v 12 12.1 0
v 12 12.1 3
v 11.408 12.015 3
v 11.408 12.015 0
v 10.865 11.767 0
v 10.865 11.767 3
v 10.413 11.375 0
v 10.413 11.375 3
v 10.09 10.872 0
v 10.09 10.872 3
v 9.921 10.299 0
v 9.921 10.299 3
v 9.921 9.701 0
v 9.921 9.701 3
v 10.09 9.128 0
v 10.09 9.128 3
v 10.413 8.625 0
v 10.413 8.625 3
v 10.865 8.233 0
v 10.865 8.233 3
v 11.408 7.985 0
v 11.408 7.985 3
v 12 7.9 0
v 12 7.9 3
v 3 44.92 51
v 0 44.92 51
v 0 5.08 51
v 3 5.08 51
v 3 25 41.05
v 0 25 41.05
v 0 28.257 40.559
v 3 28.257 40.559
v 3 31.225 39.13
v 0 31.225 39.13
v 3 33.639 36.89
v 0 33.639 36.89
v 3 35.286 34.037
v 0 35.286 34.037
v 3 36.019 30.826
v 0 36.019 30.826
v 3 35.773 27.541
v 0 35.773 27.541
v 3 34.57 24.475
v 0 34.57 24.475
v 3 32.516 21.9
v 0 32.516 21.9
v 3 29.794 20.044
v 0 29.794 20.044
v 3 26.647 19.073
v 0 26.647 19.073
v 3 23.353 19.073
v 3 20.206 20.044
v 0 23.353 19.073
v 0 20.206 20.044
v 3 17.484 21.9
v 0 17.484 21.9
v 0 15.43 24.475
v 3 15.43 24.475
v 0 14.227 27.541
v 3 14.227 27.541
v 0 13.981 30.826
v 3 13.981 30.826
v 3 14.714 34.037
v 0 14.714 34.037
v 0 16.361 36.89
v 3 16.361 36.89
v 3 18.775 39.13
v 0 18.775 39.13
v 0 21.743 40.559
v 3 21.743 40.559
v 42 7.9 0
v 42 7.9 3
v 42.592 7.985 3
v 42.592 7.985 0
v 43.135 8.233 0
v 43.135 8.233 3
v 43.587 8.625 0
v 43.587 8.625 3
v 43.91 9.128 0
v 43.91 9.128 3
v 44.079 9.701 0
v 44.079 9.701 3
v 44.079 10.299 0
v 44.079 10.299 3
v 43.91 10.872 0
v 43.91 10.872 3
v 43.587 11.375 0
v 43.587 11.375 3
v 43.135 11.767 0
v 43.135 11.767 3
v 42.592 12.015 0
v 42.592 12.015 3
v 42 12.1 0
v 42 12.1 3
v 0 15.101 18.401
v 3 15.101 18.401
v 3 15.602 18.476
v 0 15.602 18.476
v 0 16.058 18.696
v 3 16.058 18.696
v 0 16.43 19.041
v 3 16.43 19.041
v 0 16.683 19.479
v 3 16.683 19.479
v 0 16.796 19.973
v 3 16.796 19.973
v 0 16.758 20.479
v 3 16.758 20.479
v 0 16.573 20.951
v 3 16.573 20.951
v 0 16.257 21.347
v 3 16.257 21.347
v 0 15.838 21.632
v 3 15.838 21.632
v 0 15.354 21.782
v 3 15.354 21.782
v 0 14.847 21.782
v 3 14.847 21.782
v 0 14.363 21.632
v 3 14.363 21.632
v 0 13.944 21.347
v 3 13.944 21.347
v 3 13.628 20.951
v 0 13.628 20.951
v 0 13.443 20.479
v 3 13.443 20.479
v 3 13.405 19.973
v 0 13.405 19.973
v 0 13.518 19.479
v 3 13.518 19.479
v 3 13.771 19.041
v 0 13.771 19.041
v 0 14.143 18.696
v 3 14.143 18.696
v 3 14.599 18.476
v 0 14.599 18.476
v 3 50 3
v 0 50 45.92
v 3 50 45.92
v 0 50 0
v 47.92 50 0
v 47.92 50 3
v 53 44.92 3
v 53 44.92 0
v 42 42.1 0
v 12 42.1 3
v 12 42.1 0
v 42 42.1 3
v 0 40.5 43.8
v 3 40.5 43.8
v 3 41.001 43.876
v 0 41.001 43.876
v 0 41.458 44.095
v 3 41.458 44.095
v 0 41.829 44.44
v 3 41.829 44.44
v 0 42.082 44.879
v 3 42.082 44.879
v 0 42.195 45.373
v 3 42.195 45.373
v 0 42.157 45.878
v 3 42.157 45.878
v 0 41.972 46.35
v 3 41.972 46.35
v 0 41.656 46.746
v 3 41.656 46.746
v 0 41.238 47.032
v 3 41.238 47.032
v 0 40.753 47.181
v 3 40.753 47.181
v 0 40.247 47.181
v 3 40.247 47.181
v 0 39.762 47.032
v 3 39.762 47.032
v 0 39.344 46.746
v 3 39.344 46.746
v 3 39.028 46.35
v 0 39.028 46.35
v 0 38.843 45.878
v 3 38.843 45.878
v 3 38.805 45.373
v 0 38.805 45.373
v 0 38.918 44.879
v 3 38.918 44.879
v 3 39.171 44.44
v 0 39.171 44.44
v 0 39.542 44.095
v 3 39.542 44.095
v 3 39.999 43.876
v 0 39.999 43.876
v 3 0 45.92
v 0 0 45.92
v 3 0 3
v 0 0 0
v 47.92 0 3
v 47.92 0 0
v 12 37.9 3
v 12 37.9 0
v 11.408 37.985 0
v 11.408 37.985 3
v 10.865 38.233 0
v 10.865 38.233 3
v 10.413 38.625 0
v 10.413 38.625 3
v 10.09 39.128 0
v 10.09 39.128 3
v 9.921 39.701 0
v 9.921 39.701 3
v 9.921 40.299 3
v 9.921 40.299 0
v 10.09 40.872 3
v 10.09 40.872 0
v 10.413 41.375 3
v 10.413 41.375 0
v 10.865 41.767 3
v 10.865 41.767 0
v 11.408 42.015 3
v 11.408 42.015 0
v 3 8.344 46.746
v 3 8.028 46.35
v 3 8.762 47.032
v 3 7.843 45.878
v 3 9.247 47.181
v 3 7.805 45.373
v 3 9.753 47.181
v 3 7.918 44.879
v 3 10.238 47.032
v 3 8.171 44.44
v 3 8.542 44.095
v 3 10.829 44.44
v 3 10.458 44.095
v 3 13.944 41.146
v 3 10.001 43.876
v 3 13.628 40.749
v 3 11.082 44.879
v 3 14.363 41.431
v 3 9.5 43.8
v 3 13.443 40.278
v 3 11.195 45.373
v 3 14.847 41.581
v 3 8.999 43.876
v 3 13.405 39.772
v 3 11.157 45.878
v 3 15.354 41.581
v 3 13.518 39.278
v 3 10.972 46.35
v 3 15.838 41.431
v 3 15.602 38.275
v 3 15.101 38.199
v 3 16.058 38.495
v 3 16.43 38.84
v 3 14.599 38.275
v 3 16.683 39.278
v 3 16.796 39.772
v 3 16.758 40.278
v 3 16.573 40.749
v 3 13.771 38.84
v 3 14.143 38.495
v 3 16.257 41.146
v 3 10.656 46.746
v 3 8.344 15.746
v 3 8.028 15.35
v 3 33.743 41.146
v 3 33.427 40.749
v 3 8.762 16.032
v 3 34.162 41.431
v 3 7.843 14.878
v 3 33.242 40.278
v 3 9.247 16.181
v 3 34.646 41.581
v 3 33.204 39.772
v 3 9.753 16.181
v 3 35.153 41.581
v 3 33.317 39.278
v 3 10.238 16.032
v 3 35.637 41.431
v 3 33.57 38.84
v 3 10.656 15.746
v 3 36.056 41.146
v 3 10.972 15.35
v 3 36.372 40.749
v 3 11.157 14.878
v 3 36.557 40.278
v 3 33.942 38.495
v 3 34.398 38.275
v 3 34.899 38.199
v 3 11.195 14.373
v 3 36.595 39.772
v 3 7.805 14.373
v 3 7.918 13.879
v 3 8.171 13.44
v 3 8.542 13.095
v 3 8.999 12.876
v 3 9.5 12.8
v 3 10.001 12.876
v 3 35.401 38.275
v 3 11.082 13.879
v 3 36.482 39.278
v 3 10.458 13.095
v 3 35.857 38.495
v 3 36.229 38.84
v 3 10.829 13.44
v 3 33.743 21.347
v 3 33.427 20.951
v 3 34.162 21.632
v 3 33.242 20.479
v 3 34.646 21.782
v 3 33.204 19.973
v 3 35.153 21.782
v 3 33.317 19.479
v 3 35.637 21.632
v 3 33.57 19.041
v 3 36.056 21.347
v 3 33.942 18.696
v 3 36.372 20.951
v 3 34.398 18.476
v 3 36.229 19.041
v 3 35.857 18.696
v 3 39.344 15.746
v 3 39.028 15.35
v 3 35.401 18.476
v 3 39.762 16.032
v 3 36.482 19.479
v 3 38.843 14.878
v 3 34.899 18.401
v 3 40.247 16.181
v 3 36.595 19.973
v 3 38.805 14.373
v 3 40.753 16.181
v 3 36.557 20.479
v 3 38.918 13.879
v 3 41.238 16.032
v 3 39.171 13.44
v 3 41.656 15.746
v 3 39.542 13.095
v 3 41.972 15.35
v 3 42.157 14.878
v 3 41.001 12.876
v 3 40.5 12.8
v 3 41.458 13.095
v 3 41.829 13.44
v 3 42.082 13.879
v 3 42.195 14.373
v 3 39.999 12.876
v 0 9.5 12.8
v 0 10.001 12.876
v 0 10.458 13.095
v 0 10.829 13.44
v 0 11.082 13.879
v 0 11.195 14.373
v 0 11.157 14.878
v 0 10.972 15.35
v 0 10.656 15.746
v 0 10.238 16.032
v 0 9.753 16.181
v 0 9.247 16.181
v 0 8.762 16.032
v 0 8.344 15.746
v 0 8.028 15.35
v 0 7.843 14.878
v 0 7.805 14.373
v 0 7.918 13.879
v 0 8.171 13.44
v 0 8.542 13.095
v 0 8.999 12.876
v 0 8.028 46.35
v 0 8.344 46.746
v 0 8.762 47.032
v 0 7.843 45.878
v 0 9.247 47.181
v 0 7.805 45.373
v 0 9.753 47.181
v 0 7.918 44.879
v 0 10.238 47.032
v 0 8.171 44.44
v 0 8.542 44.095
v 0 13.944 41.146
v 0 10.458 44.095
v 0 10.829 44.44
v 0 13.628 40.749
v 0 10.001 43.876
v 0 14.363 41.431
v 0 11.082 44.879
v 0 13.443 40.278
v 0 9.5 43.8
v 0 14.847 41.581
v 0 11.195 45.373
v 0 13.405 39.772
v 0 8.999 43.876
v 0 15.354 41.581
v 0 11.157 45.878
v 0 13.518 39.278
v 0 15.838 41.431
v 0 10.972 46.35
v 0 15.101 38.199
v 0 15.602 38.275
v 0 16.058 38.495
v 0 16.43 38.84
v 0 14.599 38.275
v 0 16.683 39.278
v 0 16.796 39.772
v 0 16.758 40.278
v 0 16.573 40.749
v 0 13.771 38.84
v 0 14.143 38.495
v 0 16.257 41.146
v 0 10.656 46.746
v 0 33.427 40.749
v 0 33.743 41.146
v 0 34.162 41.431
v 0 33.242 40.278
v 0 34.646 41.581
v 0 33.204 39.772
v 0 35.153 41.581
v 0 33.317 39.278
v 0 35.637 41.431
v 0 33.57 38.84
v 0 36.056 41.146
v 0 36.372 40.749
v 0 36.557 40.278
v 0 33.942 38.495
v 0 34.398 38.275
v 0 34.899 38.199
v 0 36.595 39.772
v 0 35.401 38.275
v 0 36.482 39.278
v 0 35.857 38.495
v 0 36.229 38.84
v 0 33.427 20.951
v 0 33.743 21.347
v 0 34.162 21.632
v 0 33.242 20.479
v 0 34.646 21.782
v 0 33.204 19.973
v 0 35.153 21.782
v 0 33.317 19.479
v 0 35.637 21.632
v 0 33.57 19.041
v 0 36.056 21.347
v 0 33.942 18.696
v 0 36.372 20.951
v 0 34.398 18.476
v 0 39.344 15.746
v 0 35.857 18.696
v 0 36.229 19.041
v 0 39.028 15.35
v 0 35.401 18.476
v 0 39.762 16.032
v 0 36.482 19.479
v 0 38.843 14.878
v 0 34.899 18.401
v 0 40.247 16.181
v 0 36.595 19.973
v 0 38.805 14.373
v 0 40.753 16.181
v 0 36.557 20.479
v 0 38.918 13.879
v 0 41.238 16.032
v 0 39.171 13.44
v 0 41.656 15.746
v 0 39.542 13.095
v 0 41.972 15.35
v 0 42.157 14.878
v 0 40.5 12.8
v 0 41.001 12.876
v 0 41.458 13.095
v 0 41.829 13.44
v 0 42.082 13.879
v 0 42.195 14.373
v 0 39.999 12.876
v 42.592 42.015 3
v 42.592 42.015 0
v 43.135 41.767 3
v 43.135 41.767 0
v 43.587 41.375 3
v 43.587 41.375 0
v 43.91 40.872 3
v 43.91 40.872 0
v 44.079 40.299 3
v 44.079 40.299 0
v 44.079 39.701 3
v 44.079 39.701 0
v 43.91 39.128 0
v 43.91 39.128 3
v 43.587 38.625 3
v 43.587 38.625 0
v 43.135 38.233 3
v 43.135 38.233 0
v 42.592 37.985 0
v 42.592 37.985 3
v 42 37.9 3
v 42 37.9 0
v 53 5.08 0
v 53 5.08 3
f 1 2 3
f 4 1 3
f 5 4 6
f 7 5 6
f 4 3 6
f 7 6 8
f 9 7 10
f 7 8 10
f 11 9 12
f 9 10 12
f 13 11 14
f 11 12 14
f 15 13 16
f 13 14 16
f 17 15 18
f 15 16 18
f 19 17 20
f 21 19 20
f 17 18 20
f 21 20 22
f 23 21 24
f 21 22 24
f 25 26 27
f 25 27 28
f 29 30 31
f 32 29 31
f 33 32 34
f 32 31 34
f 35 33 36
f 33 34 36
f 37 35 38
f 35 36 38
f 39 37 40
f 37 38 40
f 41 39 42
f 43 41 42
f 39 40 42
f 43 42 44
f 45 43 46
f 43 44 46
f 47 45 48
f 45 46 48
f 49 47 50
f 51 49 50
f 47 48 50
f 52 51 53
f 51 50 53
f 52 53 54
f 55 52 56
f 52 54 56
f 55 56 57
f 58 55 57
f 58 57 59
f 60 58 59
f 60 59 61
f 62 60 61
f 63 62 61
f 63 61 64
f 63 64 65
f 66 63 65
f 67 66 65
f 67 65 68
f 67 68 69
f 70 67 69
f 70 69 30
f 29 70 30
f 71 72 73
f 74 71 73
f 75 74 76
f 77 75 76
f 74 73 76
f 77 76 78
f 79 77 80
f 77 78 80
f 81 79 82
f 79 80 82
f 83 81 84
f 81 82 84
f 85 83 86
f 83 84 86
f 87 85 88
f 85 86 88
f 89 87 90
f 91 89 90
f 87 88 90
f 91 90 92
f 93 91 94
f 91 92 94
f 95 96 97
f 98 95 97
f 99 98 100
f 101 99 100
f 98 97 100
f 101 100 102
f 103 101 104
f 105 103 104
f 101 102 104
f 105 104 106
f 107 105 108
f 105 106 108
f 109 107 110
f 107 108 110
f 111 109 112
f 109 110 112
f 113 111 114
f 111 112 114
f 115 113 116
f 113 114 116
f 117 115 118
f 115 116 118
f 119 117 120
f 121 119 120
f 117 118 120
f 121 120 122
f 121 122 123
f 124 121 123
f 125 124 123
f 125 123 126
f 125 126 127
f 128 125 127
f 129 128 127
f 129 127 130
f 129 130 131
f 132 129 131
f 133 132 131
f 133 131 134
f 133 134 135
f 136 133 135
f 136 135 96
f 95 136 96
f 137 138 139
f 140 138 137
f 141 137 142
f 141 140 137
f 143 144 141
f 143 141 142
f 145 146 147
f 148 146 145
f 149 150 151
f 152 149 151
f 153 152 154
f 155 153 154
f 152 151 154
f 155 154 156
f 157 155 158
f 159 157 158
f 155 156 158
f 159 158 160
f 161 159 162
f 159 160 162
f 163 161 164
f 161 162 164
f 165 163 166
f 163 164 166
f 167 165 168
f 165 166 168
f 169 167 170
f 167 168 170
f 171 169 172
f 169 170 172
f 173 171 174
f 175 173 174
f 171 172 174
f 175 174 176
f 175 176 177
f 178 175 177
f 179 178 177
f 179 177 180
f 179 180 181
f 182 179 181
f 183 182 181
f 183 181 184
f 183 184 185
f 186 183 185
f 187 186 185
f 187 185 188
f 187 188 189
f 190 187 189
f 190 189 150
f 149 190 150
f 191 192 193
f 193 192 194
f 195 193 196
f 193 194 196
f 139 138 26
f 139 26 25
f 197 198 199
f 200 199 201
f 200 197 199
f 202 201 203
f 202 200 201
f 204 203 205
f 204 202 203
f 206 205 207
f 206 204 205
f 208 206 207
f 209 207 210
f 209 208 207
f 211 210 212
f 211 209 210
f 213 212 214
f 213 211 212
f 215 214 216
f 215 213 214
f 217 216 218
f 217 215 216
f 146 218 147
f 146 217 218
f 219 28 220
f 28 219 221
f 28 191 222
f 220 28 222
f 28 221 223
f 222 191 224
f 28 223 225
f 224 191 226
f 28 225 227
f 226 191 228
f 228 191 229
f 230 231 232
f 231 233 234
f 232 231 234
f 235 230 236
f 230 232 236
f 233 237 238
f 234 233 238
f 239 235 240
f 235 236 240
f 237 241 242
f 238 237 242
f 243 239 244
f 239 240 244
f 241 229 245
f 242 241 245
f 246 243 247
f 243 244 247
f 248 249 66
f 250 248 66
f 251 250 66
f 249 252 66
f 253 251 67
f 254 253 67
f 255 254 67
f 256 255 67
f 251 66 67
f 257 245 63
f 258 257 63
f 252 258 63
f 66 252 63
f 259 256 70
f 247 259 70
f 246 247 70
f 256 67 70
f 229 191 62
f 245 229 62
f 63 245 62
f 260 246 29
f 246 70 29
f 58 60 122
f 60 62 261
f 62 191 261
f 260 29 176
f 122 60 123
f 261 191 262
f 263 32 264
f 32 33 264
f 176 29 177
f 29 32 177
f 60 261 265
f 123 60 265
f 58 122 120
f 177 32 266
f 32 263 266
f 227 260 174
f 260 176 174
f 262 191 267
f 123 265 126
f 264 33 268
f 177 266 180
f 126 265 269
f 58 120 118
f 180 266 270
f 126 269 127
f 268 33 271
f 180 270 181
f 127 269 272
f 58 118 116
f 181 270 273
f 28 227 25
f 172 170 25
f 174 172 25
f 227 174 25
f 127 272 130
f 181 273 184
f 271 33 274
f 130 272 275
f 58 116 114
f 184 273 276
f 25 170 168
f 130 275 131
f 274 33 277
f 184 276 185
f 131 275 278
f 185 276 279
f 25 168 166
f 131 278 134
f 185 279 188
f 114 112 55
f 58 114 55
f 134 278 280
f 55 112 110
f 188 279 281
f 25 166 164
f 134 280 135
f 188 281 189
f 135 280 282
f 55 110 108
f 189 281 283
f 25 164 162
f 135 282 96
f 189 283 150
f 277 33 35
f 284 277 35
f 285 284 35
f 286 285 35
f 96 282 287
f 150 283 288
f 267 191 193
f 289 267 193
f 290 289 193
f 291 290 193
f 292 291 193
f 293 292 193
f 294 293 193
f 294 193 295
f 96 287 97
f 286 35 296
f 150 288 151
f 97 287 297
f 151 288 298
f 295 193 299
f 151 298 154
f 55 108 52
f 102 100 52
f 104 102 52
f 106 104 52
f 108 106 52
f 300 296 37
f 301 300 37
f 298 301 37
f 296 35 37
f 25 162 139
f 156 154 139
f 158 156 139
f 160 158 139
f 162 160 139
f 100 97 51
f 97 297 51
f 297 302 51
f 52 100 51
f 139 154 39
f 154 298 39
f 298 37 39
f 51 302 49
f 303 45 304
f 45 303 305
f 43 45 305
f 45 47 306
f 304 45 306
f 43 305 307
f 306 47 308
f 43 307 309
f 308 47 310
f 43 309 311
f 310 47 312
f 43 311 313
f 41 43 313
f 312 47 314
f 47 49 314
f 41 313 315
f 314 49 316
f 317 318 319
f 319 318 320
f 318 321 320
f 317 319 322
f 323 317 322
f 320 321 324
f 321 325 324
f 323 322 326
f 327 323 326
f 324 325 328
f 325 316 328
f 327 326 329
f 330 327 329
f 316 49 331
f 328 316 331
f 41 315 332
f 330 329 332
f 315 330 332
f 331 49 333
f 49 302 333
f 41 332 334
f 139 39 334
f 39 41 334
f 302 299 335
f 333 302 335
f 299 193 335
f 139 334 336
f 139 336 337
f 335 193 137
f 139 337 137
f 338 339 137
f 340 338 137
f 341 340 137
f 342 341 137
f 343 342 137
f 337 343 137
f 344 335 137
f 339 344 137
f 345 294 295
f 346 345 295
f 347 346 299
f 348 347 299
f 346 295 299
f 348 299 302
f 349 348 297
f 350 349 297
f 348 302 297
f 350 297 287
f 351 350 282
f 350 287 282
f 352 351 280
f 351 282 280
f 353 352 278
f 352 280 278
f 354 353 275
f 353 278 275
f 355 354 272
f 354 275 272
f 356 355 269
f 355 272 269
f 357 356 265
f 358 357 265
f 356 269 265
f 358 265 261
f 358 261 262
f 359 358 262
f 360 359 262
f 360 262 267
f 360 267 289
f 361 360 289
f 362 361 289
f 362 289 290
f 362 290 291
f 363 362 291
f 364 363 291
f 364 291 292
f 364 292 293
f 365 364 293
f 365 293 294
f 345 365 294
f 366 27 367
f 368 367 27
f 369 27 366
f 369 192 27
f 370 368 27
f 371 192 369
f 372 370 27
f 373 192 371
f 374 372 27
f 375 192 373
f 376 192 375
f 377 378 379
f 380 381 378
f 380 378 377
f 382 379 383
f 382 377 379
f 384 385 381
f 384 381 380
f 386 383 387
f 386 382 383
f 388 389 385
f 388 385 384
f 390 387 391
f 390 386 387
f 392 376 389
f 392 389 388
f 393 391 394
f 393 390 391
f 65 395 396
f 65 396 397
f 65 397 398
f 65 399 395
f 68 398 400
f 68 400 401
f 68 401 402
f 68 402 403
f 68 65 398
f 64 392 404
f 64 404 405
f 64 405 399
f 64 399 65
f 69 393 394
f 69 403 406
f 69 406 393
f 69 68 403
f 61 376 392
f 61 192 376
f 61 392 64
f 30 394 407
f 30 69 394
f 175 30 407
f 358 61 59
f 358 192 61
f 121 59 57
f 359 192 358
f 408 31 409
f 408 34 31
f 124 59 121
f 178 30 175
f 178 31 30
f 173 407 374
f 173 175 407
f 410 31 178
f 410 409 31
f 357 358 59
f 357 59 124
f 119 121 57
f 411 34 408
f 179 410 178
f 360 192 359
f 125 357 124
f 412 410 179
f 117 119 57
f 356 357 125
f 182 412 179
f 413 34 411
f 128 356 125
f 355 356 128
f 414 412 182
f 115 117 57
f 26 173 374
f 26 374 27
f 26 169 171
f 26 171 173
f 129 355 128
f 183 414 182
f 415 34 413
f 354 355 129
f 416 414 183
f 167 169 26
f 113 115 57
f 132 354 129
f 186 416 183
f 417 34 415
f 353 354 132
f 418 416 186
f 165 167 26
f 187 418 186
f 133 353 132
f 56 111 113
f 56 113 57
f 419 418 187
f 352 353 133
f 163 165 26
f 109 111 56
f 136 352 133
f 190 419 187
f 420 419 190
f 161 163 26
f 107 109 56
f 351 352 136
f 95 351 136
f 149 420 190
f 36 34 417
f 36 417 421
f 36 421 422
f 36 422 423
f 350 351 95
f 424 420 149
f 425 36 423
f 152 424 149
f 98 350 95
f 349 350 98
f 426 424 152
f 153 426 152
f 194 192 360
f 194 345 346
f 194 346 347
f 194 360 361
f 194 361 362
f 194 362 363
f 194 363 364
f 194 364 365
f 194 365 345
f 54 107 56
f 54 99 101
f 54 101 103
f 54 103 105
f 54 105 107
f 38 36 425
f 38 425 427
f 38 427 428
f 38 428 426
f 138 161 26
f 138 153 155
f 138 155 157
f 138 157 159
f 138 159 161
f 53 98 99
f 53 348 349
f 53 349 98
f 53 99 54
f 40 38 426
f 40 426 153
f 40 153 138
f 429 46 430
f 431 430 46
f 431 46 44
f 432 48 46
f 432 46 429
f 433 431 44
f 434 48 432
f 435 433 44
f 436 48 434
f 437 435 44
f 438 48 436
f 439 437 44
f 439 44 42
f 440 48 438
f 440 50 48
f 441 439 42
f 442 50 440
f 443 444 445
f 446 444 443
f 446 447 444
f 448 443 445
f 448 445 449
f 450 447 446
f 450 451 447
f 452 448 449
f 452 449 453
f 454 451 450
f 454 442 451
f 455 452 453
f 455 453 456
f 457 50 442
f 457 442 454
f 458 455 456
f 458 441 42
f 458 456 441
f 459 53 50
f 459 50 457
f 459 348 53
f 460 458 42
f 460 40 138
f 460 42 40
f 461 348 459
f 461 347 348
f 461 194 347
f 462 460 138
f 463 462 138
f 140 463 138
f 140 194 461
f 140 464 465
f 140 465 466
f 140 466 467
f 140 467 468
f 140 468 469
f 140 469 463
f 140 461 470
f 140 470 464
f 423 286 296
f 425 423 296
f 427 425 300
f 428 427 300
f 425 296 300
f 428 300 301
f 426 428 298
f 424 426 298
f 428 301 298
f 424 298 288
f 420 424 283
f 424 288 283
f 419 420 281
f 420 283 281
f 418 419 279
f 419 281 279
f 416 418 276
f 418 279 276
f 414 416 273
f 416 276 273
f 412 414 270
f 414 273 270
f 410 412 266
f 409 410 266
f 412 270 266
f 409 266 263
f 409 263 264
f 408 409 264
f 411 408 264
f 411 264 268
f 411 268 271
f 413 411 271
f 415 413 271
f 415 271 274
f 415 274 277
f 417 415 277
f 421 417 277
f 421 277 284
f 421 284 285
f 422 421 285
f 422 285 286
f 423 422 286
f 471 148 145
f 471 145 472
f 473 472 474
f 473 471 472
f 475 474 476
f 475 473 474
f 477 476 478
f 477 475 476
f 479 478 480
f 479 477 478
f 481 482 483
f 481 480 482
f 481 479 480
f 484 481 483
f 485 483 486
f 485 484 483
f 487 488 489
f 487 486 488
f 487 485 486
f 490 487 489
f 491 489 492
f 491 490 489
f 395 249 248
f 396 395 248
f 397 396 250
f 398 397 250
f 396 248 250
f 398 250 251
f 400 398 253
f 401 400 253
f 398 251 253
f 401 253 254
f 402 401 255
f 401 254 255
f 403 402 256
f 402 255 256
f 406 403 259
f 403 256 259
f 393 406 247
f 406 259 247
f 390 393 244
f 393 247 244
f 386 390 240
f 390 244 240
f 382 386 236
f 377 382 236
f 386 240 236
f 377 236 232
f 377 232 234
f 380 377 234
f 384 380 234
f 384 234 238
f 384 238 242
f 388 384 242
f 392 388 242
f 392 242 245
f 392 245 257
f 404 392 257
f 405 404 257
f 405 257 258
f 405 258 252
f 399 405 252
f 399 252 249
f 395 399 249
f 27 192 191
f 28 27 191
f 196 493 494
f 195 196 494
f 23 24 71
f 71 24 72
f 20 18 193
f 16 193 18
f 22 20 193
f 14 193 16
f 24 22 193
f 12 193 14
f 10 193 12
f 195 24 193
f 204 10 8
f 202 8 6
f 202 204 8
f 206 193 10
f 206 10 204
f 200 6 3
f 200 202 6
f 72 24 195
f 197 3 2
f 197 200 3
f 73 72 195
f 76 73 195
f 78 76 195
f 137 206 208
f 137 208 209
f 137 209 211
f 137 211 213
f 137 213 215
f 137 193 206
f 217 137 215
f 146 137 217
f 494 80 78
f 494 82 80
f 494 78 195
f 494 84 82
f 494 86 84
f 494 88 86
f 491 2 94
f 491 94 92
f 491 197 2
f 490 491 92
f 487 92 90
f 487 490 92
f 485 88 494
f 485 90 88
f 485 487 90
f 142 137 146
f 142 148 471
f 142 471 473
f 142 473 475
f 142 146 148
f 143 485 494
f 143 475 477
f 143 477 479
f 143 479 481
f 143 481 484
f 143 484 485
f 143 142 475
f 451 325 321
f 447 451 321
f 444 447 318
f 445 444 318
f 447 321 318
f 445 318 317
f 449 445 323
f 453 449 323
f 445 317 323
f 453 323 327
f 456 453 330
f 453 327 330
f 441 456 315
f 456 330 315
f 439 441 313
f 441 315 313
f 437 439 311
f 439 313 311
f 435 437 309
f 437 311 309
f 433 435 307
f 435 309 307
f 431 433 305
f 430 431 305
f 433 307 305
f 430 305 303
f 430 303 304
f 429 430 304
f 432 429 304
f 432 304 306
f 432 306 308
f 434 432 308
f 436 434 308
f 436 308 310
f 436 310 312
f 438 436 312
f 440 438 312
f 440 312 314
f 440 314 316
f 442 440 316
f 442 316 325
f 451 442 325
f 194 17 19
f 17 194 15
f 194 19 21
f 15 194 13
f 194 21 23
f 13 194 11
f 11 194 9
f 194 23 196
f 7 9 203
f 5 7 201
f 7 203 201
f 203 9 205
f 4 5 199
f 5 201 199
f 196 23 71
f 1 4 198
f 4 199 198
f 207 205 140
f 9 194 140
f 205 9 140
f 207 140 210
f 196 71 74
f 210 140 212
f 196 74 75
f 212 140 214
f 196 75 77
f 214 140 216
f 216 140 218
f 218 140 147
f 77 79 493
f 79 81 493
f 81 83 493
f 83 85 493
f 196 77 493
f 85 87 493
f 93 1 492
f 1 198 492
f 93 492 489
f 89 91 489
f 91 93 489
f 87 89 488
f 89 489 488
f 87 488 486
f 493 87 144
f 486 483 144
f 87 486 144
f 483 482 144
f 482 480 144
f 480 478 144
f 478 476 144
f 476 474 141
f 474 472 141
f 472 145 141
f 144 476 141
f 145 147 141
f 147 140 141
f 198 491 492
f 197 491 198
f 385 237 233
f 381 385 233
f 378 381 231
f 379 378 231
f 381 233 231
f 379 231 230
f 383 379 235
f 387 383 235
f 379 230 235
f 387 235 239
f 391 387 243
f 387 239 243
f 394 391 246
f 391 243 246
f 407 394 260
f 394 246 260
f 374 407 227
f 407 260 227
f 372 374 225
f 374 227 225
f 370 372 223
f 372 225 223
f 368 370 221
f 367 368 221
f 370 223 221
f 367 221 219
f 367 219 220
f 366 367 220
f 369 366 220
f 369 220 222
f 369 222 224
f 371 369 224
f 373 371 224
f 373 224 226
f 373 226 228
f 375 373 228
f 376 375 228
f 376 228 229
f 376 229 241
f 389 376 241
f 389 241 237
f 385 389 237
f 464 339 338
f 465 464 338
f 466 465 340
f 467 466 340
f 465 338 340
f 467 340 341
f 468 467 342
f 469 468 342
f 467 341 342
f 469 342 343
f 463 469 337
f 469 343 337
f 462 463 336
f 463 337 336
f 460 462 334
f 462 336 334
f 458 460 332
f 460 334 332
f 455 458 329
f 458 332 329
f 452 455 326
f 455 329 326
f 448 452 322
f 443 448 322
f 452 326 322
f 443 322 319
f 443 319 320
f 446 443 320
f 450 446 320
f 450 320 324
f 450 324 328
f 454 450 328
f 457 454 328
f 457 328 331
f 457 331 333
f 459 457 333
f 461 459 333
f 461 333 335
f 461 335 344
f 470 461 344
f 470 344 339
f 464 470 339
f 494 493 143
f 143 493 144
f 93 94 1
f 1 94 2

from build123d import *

# Parameters (mm, degrees)
SKETCH1_W            = 53
SKETCH1_H            = 50
BOSS_EXTRUDE1_DEPTH  = 3
CUT_EXTRUDE1_DEPTH   = 73.924618614
SKETCH3_W            = 3
SKETCH3_H            = 50
BOSS_EXTRUDE2_DEPTH  = 48
SKETCH4_R            = 11.05
CUT_EXTRUDE2_DEPTH   = 89.938180777
M3_CLEARANCE_HOLE1_D = 3.4
M3_CLEARANCE_HOLE2_D = 3.4
CHAMFER1_SIZE        = 5.08


with BuildPart() as part:
    # Sketch1 → Boss-Extrude1 (new body)
    with BuildSketch(Plane.XY):
        with Locations((26.5, 25)):
            Rectangle(SKETCH1_W, SKETCH1_H)
    extrude(amount=BOSS_EXTRUDE1_DEPTH)

    # Sketch2 → Cut-Extrude1 (cut, through all)
    with BuildSketch(Plane.XY.offset(3)):
        with BuildLine():
            Line((42, 37.9), (12, 37.9))
            ThreePointArc((12, 37.9), (9.9, 40), (12, 42.1))
            Line((12, 42.1), (42, 42.1))
            ThreePointArc((42, 42.1), (44.1, 40), (42, 37.9))
        make_face()
        with BuildLine():
            Line((42, 12.1), (12, 12.1))
            ThreePointArc((12, 12.1), (9.9, 10), (12, 7.9))
            Line((12, 7.9), (42, 7.9))
            ThreePointArc((42, 7.9), (44.1, 10), (42, 12.1))
        make_face()
    extrude(amount=-CUT_EXTRUDE1_DEPTH, mode=Mode.SUBTRACT)

    # Sketch3 → Boss-Extrude2 (add)
    with BuildSketch(Plane.XY.offset(3)):
        with Locations((1.5, 25)):
            Rectangle(SKETCH3_W, SKETCH3_H)
    extrude(amount=BOSS_EXTRUDE2_DEPTH)

    # Sketch4 → Cut-Extrude2 (cut, through all)
    with BuildSketch(Plane.ZY):
        with Locations((30, 25)):
            Circle(SKETCH4_R)
    extrude(amount=-CUT_EXTRUDE2_DEPTH, mode=Mode.SUBTRACT)

    # M3 Clearance Hole1 (through all)
    with Locations(Plane.ZY):
        with Locations((45.5, 9.5), (14.5, 40.5), (14.5, 9.5), (45.5, 40.5)):
            Hole(M3_CLEARANCE_HOLE1_D / 2)

    # M3 Clearance Hole2 (through all)
    with Locations(Plane.ZY):
        with Locations((39.899494937, 34.899494937), (39.899494937, 15.100505063), (20.100505063, 34.899494937), (20.100505063, 15.100505063)):
            Hole(M3_CLEARANCE_HOLE2_D / 2)

    # Chamfer1
    chamfer1_edges = [part.edges().sort_by_distance(p)[0] for p in [
        (1.5, 0, 51),
        (1.5, 50, 51),
        (53, 50, 1.5),
        (53, 0, 1.5),
    ]]
    chamfer(chamfer1_edges, length=CHAMFER1_SIZE)


solid = part.part
